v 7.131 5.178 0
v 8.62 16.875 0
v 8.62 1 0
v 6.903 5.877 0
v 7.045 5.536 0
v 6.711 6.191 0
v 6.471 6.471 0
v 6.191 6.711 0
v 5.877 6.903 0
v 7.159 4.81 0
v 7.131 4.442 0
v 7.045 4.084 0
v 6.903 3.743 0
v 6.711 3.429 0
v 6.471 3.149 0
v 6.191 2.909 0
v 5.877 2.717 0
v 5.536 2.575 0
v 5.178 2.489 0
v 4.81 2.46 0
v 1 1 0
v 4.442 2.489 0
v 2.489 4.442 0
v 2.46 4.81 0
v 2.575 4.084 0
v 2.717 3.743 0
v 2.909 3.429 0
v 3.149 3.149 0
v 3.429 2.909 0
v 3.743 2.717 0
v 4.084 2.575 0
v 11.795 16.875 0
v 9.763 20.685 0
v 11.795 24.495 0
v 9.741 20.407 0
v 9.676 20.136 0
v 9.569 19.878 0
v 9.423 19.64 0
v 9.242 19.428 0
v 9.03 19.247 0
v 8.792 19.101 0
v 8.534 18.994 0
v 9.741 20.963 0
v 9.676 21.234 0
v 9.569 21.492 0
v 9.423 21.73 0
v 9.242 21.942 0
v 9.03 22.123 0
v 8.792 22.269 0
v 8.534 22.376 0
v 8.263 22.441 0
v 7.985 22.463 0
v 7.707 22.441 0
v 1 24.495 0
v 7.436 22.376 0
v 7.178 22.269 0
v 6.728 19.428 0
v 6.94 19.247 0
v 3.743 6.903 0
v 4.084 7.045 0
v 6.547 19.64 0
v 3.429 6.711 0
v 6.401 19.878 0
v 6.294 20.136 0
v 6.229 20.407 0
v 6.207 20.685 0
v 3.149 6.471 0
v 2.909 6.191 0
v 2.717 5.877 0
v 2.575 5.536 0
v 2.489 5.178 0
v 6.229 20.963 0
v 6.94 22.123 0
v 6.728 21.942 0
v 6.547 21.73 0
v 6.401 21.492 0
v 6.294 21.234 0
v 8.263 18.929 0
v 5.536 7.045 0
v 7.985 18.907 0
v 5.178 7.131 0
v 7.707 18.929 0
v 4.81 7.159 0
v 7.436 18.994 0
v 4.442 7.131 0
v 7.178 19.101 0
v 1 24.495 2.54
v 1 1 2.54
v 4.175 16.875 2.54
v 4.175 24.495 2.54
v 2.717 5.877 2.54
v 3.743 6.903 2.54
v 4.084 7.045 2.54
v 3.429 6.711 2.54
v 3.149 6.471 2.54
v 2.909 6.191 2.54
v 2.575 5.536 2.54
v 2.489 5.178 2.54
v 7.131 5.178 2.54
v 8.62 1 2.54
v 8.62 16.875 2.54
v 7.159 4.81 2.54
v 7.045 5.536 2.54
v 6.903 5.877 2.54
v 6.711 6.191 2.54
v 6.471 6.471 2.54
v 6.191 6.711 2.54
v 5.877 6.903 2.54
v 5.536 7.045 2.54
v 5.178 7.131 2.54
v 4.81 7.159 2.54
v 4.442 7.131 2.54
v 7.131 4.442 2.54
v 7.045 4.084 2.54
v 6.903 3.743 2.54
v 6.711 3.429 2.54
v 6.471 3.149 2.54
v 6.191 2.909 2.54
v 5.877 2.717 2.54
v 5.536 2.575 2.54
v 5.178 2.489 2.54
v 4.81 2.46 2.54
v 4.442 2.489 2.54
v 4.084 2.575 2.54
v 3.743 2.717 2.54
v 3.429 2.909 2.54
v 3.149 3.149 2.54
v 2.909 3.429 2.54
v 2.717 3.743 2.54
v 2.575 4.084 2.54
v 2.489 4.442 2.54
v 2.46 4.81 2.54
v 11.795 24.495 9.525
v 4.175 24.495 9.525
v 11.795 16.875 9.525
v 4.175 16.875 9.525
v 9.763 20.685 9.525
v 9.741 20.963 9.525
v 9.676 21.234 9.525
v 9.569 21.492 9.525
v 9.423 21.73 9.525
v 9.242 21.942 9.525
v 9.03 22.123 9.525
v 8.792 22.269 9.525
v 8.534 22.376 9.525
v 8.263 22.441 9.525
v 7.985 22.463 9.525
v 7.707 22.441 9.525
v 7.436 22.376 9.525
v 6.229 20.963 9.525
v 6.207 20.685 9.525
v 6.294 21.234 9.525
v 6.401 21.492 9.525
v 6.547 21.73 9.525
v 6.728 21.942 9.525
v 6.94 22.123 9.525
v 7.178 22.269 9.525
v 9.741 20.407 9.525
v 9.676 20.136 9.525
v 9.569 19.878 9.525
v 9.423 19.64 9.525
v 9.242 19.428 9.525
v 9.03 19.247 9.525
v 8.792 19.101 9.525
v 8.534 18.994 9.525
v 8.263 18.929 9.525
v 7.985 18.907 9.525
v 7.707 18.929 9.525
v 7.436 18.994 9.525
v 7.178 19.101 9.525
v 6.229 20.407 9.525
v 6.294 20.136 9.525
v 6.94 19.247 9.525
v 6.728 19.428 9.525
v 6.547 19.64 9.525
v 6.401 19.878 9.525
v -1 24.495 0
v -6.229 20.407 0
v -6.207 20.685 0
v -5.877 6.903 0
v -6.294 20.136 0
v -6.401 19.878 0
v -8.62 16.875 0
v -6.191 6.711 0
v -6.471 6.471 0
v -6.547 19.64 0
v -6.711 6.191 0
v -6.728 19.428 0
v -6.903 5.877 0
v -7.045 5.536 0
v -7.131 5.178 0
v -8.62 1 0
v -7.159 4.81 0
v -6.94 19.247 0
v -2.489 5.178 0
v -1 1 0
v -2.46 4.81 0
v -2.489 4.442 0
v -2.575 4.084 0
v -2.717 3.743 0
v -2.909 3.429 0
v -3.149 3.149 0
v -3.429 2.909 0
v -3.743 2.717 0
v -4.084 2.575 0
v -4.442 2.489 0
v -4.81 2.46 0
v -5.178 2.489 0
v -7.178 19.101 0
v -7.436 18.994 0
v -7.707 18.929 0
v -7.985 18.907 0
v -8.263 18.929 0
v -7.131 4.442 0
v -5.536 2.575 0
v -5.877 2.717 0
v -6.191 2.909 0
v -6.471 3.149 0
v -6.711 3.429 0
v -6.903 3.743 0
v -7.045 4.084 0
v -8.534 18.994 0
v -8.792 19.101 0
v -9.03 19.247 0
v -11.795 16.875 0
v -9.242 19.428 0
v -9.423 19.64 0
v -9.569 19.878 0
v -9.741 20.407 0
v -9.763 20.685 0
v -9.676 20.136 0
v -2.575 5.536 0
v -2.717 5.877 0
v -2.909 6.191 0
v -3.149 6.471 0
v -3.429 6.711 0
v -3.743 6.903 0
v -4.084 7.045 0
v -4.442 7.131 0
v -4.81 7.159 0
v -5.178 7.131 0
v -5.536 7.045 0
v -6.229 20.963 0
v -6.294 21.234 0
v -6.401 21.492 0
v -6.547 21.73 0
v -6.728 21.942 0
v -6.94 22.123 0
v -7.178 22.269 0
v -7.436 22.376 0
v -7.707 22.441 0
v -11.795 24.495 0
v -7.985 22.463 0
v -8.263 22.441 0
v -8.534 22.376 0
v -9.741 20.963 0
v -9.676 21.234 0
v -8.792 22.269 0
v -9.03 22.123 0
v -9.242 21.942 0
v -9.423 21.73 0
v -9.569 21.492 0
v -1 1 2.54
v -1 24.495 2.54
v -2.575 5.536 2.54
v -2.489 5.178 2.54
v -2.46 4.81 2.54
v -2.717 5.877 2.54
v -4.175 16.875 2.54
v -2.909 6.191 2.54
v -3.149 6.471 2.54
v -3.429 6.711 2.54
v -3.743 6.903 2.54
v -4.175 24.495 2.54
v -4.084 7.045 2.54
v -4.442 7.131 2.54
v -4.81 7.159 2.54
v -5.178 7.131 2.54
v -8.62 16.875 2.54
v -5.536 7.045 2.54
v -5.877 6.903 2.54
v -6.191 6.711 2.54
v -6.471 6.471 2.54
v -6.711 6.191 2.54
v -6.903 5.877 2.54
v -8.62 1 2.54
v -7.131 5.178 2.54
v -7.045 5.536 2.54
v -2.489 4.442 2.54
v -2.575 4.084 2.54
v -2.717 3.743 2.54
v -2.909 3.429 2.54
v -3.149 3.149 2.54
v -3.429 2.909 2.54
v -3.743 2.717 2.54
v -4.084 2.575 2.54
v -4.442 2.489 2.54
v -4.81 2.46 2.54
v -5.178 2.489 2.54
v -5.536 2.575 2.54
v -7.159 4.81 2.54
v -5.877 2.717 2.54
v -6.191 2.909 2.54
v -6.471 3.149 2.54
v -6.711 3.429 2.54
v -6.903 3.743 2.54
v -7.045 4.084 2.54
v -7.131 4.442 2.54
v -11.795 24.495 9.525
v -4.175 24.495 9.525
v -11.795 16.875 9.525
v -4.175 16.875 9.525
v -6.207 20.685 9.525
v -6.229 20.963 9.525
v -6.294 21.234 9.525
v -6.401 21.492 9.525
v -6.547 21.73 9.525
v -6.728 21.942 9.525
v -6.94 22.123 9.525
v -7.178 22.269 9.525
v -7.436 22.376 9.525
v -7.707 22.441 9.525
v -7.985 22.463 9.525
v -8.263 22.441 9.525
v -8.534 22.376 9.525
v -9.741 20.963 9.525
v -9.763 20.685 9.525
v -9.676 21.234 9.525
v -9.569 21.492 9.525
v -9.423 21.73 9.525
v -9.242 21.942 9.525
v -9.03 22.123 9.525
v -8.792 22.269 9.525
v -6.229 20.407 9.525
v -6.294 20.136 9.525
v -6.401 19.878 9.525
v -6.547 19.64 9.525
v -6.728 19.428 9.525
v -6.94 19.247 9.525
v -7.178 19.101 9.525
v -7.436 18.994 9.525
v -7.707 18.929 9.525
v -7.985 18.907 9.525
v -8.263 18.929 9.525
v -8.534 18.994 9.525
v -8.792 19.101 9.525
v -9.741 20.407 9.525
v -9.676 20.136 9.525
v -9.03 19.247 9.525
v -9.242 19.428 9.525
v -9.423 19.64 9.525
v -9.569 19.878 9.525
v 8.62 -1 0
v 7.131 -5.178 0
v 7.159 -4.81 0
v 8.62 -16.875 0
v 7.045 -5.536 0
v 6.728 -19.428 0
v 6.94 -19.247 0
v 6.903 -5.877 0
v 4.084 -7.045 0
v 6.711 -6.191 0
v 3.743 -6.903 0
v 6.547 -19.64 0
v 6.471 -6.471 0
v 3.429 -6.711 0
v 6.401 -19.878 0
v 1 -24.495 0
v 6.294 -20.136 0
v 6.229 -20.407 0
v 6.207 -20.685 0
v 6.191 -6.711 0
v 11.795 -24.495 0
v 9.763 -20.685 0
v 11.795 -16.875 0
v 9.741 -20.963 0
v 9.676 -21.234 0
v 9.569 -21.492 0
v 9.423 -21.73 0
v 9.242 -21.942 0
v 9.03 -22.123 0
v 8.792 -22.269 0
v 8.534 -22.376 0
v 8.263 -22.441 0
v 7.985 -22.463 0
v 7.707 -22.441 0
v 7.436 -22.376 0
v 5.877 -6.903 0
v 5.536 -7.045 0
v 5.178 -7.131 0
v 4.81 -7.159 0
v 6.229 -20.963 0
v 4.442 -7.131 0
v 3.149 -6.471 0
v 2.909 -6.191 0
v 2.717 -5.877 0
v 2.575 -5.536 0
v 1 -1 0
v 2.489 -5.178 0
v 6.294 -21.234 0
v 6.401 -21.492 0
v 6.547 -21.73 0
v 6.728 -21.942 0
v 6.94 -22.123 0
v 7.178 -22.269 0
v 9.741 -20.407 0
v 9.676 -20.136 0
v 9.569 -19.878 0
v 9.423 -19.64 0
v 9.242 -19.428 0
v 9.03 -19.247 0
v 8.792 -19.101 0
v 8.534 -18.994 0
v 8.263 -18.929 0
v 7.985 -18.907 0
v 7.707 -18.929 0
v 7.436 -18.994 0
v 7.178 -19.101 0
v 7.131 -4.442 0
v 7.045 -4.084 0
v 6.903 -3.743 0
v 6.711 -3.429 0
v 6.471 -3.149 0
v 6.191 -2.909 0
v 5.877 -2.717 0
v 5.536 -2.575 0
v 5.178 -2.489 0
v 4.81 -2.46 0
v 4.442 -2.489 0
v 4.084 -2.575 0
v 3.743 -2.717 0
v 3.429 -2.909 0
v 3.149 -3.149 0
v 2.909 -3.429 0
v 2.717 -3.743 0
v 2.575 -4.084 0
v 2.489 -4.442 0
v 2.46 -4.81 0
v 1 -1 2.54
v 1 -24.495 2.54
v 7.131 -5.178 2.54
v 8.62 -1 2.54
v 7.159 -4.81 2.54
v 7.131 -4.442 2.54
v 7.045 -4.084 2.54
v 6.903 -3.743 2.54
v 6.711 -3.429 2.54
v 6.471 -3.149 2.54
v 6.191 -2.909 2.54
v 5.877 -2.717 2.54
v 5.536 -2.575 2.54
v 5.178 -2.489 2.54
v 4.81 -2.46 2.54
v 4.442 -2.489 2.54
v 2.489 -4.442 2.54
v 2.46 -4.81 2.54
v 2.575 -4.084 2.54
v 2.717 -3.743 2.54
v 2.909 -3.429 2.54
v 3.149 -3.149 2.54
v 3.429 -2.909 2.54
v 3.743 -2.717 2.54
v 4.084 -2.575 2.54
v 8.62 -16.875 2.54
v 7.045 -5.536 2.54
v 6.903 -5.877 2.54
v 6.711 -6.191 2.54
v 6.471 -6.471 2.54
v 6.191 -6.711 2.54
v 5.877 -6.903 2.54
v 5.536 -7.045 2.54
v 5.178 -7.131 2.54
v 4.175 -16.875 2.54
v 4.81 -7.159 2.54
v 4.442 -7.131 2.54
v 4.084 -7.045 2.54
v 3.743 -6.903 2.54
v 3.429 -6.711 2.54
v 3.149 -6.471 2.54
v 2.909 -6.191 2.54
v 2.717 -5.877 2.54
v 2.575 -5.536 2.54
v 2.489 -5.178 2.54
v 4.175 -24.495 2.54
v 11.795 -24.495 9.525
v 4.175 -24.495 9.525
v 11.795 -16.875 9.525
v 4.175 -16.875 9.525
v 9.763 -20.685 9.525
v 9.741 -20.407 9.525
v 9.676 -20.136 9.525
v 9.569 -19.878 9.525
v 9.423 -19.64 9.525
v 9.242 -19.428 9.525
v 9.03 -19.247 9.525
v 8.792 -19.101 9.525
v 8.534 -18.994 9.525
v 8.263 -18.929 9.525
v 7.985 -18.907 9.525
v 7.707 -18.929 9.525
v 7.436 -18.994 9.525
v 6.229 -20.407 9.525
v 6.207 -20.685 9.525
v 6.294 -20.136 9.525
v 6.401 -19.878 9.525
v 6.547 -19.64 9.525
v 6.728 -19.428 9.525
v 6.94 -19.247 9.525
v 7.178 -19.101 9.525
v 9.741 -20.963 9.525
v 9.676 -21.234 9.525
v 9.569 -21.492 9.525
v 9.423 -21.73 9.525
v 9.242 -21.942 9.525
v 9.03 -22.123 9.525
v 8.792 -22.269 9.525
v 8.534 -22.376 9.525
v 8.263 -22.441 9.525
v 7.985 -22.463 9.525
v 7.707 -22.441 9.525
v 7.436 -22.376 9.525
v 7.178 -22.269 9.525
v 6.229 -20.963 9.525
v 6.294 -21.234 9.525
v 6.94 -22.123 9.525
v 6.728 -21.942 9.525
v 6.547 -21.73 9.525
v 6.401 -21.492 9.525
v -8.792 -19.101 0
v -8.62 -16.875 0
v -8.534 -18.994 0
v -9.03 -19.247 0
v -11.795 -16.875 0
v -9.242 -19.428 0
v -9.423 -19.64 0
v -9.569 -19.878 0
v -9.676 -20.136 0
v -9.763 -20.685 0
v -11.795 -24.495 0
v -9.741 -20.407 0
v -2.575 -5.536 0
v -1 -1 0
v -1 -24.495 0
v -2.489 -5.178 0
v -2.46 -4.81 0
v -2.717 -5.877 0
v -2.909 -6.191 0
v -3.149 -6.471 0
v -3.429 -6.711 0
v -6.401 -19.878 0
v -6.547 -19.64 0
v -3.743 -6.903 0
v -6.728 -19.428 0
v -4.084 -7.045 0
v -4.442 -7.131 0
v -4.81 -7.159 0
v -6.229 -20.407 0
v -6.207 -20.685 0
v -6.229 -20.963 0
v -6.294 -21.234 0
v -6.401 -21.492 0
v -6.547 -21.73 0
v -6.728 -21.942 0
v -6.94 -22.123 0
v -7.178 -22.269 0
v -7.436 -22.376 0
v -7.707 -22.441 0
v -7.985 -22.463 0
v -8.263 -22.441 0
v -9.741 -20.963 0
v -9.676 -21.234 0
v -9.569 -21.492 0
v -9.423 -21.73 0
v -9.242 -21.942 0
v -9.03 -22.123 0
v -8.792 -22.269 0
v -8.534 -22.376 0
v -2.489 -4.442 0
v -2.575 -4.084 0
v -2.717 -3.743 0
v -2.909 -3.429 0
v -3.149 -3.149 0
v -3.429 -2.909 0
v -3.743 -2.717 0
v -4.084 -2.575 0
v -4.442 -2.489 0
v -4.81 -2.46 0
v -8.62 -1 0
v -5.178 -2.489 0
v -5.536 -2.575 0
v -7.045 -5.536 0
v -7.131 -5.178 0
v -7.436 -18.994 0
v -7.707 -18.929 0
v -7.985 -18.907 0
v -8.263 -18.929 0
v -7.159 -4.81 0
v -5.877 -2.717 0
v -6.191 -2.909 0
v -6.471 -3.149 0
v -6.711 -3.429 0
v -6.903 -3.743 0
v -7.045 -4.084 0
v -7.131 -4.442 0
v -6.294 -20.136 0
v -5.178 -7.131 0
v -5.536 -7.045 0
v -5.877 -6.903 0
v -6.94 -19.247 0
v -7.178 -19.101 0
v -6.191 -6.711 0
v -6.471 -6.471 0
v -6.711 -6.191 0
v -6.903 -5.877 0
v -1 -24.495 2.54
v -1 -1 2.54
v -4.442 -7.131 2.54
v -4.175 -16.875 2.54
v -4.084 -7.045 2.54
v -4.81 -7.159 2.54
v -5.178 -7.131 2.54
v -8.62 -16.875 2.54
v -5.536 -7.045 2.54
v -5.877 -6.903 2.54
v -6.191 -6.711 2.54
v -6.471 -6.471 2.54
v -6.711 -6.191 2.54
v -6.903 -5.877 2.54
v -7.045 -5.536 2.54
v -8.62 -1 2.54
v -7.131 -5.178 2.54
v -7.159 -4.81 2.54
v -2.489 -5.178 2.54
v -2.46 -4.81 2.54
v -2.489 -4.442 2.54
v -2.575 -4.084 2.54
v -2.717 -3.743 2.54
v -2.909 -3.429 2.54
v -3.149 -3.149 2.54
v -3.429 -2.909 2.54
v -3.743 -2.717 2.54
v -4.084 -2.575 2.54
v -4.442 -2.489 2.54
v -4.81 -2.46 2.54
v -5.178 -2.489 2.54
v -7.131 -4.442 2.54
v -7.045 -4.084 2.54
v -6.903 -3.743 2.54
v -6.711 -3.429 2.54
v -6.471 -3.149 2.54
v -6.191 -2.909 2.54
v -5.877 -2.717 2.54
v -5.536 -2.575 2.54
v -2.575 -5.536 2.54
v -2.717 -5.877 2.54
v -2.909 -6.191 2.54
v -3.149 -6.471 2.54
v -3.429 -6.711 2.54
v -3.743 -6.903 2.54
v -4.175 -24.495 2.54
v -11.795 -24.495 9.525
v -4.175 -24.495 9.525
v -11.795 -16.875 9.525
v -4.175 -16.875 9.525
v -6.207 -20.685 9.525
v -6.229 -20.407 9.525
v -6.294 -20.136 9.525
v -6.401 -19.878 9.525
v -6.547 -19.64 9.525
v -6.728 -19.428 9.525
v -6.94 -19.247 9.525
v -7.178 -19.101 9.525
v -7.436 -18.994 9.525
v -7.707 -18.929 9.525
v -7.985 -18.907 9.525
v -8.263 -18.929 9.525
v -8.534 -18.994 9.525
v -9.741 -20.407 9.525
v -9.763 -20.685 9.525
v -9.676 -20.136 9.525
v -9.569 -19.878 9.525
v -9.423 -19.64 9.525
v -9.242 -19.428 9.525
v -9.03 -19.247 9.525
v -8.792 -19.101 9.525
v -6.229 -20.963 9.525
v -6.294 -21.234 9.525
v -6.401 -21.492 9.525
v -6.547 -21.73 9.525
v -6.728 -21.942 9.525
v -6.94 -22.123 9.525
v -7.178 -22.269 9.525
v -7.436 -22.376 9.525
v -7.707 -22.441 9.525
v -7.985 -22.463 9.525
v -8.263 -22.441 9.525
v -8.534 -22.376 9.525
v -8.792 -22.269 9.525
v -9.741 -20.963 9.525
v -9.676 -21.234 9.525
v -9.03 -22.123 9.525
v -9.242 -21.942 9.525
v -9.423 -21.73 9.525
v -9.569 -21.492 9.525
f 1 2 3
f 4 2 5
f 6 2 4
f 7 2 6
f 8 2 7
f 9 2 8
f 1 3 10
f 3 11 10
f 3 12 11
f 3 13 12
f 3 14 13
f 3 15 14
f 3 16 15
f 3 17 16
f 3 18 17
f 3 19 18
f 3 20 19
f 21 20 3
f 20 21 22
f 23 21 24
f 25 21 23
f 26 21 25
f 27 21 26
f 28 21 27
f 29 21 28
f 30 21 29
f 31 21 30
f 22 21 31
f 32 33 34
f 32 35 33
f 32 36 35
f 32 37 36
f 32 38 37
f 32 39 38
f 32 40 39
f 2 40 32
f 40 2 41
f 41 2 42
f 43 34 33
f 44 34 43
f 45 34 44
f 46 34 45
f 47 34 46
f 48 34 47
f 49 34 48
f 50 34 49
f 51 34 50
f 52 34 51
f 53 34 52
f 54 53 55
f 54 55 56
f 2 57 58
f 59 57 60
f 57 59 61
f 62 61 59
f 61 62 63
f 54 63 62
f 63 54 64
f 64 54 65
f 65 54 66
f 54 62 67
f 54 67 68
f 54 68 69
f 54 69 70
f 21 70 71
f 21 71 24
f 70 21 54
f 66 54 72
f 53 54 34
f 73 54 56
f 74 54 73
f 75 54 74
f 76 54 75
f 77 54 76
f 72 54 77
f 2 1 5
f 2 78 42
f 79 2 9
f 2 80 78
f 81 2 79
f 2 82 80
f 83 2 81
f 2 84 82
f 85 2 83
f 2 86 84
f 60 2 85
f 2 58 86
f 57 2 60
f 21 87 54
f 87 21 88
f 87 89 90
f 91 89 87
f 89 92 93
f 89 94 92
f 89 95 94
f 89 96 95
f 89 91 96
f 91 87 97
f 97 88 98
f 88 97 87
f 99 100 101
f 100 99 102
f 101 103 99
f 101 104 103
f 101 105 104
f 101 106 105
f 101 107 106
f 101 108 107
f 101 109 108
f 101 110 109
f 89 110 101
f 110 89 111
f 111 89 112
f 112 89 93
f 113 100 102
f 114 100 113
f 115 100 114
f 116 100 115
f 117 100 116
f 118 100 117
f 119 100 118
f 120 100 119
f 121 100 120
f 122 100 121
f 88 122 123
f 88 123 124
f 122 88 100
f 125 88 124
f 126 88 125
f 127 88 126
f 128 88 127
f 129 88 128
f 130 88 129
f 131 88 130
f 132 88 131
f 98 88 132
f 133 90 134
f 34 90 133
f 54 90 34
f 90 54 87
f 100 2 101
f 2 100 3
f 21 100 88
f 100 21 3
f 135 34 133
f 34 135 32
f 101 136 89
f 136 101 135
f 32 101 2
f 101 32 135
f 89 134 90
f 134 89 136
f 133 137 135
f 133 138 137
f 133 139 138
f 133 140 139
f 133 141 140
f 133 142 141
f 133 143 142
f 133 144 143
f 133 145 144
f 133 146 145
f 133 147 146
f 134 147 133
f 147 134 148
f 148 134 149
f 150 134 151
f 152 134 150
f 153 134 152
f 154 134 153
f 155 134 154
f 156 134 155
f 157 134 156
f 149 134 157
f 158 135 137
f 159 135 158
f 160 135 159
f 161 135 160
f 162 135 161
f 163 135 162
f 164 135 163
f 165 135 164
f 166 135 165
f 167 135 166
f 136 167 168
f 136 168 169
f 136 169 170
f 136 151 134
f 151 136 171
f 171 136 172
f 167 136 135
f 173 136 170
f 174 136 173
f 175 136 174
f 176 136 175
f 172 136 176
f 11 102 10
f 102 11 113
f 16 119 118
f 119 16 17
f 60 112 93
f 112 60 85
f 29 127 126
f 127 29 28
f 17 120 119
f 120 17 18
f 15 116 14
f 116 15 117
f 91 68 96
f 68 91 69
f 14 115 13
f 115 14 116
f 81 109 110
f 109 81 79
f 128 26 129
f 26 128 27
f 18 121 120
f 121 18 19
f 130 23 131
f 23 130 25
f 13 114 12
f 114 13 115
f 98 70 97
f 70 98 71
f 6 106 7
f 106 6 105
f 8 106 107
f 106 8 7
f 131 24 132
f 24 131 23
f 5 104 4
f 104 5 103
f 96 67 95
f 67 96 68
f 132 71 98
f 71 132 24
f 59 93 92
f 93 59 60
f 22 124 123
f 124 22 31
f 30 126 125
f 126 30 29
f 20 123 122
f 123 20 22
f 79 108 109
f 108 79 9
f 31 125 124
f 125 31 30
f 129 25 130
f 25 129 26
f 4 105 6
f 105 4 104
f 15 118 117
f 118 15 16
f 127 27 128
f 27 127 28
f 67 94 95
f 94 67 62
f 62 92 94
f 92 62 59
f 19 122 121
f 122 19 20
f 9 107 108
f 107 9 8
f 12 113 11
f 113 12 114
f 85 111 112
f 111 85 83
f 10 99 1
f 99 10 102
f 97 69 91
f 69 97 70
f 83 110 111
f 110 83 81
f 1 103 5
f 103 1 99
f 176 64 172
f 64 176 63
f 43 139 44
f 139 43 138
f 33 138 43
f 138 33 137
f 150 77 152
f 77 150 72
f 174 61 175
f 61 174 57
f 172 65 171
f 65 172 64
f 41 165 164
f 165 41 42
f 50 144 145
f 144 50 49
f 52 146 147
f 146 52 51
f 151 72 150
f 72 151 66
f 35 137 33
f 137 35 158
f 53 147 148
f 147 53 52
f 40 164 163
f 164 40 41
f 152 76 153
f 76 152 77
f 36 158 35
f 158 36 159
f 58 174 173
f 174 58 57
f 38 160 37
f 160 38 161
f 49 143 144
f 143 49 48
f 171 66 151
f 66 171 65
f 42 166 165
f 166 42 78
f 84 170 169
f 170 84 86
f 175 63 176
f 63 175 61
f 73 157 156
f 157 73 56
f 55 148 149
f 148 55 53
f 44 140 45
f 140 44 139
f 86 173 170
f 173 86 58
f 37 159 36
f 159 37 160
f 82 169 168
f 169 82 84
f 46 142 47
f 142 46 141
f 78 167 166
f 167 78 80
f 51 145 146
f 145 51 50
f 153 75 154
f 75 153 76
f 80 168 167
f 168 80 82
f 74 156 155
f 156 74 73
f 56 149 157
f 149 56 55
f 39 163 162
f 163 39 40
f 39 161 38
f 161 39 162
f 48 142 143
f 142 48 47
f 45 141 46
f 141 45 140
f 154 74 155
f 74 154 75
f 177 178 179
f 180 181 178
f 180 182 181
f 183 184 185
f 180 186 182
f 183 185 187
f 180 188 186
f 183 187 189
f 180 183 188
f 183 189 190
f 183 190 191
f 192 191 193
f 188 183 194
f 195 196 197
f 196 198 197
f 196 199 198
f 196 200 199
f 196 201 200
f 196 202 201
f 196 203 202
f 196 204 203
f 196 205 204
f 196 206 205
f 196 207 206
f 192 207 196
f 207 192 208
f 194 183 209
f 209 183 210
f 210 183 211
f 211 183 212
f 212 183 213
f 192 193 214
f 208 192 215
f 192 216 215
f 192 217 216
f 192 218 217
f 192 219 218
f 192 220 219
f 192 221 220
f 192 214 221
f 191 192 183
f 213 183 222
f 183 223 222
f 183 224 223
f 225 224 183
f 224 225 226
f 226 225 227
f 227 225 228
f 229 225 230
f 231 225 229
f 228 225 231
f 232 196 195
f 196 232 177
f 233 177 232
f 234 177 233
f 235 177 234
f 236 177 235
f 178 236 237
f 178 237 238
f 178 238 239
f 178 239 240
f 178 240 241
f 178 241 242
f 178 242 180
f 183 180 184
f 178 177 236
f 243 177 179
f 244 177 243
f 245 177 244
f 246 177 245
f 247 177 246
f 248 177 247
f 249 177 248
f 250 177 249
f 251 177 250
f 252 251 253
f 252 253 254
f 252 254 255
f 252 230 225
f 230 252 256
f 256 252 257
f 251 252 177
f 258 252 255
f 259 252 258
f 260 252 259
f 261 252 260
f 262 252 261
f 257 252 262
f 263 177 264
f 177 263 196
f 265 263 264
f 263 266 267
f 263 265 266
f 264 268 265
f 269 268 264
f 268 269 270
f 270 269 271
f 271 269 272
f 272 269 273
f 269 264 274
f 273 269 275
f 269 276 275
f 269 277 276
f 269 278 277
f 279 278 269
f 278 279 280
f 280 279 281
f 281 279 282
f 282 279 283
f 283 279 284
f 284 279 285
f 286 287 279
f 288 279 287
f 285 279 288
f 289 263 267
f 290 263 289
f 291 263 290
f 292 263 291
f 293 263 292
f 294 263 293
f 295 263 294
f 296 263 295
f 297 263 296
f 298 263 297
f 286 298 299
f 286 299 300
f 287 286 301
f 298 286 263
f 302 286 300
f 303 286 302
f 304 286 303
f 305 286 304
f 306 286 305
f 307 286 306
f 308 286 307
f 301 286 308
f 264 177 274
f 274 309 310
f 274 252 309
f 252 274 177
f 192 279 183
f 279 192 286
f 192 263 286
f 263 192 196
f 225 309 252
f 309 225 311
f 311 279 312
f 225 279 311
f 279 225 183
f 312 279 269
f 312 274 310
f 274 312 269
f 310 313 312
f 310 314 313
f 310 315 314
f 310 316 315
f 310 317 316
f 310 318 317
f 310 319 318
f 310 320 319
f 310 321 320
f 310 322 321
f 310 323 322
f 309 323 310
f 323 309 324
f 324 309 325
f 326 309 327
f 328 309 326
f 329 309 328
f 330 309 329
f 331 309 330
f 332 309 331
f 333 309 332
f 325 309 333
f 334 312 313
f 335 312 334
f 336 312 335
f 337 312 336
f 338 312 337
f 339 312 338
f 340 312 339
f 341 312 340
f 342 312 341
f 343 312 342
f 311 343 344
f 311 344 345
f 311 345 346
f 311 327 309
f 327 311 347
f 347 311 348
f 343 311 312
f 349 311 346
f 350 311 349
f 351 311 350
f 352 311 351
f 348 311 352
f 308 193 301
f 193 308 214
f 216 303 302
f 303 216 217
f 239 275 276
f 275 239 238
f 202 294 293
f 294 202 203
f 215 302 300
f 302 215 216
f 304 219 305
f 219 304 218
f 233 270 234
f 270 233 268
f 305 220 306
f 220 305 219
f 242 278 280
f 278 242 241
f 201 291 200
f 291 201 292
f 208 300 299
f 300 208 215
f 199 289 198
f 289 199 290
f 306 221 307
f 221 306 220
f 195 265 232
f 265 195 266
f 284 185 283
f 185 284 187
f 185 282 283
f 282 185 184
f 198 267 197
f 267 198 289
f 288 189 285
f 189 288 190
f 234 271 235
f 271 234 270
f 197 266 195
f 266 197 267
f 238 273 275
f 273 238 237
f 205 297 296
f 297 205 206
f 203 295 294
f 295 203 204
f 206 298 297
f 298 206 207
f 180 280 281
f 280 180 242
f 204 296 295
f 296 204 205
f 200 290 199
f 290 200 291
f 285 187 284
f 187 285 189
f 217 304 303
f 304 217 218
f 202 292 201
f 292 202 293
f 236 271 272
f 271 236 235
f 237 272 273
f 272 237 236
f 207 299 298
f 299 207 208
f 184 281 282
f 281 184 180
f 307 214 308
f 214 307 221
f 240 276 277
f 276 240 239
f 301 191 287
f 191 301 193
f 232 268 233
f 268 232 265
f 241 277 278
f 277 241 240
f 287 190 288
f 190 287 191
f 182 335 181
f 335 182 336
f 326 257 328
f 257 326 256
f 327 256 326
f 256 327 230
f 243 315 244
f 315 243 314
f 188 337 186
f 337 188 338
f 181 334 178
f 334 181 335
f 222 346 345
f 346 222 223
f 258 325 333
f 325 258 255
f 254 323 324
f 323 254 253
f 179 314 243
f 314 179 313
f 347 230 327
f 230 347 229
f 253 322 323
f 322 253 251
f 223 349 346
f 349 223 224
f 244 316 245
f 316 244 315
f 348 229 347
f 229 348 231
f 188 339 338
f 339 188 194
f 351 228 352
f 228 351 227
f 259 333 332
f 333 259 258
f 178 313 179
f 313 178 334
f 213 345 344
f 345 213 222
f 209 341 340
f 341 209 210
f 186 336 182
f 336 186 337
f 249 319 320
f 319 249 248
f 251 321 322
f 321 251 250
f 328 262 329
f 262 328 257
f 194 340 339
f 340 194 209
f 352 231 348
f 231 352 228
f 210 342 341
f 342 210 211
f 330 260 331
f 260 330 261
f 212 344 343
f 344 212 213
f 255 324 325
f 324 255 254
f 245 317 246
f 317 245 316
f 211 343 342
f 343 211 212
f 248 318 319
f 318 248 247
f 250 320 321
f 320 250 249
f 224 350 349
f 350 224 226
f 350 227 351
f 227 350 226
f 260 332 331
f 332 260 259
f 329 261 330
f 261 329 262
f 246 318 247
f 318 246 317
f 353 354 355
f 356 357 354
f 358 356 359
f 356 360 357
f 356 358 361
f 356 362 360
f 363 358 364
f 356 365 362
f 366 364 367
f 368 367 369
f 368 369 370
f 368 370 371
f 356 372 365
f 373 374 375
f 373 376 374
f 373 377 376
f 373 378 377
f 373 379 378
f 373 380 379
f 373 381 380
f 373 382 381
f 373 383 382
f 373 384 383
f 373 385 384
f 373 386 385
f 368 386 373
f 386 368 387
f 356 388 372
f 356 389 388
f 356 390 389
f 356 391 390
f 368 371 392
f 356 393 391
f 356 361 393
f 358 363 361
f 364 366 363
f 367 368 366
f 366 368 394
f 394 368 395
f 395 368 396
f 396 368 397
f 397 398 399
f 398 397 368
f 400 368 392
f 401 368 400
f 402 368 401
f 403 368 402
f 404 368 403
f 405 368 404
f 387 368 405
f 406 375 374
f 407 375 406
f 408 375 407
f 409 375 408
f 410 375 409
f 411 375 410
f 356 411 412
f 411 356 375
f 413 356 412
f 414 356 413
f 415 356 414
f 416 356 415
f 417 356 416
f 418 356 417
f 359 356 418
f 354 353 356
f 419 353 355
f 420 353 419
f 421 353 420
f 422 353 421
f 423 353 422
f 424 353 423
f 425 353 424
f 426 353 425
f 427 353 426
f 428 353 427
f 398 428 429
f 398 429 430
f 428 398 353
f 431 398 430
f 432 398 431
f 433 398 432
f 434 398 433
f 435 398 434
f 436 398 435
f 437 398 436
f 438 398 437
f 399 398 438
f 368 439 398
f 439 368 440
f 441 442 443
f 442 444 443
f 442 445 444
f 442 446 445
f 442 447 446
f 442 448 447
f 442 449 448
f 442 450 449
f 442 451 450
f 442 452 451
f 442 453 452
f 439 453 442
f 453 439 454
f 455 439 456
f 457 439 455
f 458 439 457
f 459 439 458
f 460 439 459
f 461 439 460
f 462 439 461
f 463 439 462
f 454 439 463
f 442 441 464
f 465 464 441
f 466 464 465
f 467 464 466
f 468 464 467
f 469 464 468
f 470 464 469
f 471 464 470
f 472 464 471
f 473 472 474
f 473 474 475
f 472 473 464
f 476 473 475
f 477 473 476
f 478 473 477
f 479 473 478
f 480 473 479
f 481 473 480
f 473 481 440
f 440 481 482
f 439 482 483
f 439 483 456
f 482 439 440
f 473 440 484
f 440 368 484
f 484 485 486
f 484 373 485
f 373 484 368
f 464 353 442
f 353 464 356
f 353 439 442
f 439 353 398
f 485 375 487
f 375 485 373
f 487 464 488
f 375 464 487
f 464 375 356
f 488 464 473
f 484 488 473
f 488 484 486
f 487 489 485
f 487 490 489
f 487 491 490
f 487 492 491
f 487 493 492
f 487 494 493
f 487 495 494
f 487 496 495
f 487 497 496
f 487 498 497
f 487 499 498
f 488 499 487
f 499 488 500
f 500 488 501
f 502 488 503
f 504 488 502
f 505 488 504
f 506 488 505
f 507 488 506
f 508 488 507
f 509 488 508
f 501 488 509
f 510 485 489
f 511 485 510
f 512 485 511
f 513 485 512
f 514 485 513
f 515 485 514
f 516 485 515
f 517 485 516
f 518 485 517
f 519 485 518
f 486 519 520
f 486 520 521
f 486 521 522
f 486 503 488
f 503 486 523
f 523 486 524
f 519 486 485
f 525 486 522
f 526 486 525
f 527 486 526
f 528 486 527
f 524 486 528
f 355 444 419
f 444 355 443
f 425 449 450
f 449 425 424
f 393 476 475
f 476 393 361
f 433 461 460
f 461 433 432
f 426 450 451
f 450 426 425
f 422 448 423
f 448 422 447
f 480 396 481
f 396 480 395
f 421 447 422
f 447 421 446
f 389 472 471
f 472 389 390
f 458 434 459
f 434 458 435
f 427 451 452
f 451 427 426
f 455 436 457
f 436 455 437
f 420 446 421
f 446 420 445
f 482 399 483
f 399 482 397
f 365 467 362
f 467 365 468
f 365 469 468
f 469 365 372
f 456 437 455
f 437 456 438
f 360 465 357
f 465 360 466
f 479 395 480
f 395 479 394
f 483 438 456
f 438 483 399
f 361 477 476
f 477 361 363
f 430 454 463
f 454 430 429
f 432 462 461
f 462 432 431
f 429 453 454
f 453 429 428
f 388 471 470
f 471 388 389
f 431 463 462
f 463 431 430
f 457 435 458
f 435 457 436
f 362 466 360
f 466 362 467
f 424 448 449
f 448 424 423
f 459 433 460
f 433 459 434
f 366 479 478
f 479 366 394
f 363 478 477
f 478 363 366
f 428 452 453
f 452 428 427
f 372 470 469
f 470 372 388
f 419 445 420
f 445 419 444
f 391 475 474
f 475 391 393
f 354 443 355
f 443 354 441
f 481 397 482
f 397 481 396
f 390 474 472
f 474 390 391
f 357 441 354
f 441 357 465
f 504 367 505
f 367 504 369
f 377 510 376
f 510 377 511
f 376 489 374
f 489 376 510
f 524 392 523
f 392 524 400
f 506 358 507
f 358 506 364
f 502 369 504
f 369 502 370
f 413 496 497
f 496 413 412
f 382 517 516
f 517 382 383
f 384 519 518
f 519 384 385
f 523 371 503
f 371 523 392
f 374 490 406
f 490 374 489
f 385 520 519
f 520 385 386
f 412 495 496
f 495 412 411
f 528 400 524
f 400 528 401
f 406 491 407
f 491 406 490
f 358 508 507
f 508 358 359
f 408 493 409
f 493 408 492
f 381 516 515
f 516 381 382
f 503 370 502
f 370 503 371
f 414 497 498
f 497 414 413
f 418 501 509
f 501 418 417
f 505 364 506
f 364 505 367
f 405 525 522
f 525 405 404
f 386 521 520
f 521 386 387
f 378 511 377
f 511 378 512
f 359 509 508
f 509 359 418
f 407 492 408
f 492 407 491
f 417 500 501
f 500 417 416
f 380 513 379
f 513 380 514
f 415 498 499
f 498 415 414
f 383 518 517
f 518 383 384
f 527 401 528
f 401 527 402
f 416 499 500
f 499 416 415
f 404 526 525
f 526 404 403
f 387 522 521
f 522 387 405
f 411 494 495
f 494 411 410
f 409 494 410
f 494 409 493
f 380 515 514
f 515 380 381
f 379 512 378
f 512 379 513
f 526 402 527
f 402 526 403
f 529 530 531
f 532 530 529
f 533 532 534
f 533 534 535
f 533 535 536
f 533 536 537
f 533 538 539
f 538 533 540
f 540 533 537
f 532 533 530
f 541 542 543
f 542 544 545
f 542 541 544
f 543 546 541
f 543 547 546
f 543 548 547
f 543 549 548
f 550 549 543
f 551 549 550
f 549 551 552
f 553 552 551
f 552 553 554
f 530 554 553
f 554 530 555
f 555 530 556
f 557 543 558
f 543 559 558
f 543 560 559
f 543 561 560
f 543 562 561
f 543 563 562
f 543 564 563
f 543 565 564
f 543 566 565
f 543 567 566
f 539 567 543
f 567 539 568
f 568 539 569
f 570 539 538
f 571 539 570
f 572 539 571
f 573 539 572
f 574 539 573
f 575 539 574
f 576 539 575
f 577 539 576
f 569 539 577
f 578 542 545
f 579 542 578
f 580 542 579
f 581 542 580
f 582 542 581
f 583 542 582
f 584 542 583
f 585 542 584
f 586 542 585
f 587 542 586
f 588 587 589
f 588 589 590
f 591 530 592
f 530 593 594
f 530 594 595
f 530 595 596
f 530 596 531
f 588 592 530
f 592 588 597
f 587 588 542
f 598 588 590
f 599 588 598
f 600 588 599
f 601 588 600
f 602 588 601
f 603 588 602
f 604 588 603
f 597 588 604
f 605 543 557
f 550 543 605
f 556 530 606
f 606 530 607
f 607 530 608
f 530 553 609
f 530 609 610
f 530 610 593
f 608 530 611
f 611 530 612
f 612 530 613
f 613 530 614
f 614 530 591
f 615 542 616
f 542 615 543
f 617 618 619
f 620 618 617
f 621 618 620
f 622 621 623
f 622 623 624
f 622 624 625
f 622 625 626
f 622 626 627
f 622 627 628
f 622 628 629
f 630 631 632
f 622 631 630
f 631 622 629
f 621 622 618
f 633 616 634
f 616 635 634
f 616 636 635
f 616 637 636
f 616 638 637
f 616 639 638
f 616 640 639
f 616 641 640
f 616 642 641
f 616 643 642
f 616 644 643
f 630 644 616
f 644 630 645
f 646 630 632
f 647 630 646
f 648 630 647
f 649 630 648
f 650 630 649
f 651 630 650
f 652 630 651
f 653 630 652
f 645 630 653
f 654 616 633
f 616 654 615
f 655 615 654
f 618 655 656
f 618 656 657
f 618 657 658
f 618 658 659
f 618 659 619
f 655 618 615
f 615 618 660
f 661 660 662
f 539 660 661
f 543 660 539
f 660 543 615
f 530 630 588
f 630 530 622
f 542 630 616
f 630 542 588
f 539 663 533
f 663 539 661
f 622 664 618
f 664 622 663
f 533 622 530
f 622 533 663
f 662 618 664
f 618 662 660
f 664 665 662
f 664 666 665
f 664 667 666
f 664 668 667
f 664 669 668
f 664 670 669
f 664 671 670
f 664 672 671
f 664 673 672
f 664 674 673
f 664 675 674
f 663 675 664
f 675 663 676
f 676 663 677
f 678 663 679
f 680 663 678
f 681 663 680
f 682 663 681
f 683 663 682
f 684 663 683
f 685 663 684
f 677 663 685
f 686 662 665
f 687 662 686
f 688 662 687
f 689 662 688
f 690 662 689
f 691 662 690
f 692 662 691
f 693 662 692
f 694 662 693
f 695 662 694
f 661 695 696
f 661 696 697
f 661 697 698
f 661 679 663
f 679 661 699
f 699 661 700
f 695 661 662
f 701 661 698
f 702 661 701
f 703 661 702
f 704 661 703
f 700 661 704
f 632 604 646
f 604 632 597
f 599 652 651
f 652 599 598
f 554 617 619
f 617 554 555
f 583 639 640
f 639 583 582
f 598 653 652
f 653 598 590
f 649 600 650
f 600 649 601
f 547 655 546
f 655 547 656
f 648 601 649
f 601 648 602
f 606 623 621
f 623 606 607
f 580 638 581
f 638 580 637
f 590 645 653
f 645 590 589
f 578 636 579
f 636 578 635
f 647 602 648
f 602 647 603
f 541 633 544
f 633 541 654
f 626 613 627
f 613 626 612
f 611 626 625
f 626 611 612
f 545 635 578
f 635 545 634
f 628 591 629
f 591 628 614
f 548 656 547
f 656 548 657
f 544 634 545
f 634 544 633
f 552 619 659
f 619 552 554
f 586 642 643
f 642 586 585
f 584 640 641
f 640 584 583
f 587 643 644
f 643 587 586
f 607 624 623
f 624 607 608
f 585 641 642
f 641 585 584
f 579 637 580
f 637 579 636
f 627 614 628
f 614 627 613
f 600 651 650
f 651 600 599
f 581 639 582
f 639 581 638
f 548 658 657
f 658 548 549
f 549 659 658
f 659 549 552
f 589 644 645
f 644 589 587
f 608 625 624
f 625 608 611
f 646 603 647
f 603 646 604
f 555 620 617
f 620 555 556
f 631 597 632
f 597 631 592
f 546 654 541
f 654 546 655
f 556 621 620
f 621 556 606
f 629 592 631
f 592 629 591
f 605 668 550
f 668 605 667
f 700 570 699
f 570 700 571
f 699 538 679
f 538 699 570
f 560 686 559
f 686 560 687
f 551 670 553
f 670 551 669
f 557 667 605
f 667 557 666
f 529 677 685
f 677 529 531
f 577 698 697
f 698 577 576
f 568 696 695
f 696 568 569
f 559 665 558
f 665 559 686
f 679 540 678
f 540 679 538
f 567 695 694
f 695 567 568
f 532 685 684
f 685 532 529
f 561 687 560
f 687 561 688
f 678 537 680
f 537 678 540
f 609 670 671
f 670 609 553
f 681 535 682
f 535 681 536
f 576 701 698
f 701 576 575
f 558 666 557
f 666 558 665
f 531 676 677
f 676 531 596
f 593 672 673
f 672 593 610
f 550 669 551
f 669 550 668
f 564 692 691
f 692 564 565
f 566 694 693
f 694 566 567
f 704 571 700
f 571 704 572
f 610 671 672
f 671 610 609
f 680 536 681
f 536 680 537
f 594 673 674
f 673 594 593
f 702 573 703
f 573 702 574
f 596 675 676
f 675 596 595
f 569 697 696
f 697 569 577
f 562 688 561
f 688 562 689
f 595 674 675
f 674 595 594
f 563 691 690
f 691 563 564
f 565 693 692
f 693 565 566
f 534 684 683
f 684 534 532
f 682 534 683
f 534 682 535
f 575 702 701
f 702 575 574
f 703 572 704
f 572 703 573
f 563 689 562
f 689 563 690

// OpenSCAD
$fn = 40;

inches_to_mm = 25.4;

hole_1_diameter = 0.185*inches_to_mm;
hole_2_diameter = 0.140*inches_to_mm;
dx_h1h2_center = 1/8*inches_to_mm;
dy_h1h2_center = 5/8*inches_to_mm;
spacer_width = 0.3*inches_to_mm;
spacer_thickness = 0.1*inches_to_mm;
standoff_thickness = 0.375*inches_to_mm;

translate([1,1,0]) bracket_1();
translate([-1,1,0]) bracket_2();
translate([1,-1,0]) bracket_3();
translate([-1,-1,0]) bracket_4();
               

module bracket_1()
{
  difference()
  {
    union()
    {
      // A
      linear_extrude(height=spacer_thickness) square([spacer_width,dy_h1h2_center+spacer_width]);
      // B
      linear_extrude(height=spacer_thickness) translate([0,dy_h1h2_center]) square([dx_h1h2_center+spacer_width,spacer_width]);
      // C
      linear_extrude(height=standoff_thickness) translate([dx_h1h2_center,dy_h1h2_center]) square([spacer_width,spacer_width]);
    }



    translate([0,0,-1]) linear_extrude(height=spacer_thickness+2) translate([spacer_width/2,spacer_width/2]) circle(r=hole_1_diameter/2);
    translate([0,0,-1]) linear_extrude(height=standoff_thickness+2) translate([dx_h1h2_center+spacer_width/2,dy_h1h2_center+spacer_width/2]) circle(r=hole_2_diameter/2);
  }
}

module bracket_2()
{
  multmatrix(m = [ [-1, 0, 0, 0],
		  [0, 1, 0, 0],
		  [0, 0, 1, 0],
		  [0, 0, 0, 1]
		]) bracket_1();
}

module bracket_3()
{
  multmatrix(m = [ [1, 0, 0, 0],
		  [0, -1, 0, 0],
		  [0, 0, 1, 0],
		  [0, 0, 0, 1]
		]) bracket_1();
}

module bracket_4()
{
  multmatrix(m = [ [-1, 0, 0, 0],
		  [0, -1, 0, 0],
		  [0, 0, 1, 0],
		  [0, 0, 0, 1]
		]) bracket_1();
}
